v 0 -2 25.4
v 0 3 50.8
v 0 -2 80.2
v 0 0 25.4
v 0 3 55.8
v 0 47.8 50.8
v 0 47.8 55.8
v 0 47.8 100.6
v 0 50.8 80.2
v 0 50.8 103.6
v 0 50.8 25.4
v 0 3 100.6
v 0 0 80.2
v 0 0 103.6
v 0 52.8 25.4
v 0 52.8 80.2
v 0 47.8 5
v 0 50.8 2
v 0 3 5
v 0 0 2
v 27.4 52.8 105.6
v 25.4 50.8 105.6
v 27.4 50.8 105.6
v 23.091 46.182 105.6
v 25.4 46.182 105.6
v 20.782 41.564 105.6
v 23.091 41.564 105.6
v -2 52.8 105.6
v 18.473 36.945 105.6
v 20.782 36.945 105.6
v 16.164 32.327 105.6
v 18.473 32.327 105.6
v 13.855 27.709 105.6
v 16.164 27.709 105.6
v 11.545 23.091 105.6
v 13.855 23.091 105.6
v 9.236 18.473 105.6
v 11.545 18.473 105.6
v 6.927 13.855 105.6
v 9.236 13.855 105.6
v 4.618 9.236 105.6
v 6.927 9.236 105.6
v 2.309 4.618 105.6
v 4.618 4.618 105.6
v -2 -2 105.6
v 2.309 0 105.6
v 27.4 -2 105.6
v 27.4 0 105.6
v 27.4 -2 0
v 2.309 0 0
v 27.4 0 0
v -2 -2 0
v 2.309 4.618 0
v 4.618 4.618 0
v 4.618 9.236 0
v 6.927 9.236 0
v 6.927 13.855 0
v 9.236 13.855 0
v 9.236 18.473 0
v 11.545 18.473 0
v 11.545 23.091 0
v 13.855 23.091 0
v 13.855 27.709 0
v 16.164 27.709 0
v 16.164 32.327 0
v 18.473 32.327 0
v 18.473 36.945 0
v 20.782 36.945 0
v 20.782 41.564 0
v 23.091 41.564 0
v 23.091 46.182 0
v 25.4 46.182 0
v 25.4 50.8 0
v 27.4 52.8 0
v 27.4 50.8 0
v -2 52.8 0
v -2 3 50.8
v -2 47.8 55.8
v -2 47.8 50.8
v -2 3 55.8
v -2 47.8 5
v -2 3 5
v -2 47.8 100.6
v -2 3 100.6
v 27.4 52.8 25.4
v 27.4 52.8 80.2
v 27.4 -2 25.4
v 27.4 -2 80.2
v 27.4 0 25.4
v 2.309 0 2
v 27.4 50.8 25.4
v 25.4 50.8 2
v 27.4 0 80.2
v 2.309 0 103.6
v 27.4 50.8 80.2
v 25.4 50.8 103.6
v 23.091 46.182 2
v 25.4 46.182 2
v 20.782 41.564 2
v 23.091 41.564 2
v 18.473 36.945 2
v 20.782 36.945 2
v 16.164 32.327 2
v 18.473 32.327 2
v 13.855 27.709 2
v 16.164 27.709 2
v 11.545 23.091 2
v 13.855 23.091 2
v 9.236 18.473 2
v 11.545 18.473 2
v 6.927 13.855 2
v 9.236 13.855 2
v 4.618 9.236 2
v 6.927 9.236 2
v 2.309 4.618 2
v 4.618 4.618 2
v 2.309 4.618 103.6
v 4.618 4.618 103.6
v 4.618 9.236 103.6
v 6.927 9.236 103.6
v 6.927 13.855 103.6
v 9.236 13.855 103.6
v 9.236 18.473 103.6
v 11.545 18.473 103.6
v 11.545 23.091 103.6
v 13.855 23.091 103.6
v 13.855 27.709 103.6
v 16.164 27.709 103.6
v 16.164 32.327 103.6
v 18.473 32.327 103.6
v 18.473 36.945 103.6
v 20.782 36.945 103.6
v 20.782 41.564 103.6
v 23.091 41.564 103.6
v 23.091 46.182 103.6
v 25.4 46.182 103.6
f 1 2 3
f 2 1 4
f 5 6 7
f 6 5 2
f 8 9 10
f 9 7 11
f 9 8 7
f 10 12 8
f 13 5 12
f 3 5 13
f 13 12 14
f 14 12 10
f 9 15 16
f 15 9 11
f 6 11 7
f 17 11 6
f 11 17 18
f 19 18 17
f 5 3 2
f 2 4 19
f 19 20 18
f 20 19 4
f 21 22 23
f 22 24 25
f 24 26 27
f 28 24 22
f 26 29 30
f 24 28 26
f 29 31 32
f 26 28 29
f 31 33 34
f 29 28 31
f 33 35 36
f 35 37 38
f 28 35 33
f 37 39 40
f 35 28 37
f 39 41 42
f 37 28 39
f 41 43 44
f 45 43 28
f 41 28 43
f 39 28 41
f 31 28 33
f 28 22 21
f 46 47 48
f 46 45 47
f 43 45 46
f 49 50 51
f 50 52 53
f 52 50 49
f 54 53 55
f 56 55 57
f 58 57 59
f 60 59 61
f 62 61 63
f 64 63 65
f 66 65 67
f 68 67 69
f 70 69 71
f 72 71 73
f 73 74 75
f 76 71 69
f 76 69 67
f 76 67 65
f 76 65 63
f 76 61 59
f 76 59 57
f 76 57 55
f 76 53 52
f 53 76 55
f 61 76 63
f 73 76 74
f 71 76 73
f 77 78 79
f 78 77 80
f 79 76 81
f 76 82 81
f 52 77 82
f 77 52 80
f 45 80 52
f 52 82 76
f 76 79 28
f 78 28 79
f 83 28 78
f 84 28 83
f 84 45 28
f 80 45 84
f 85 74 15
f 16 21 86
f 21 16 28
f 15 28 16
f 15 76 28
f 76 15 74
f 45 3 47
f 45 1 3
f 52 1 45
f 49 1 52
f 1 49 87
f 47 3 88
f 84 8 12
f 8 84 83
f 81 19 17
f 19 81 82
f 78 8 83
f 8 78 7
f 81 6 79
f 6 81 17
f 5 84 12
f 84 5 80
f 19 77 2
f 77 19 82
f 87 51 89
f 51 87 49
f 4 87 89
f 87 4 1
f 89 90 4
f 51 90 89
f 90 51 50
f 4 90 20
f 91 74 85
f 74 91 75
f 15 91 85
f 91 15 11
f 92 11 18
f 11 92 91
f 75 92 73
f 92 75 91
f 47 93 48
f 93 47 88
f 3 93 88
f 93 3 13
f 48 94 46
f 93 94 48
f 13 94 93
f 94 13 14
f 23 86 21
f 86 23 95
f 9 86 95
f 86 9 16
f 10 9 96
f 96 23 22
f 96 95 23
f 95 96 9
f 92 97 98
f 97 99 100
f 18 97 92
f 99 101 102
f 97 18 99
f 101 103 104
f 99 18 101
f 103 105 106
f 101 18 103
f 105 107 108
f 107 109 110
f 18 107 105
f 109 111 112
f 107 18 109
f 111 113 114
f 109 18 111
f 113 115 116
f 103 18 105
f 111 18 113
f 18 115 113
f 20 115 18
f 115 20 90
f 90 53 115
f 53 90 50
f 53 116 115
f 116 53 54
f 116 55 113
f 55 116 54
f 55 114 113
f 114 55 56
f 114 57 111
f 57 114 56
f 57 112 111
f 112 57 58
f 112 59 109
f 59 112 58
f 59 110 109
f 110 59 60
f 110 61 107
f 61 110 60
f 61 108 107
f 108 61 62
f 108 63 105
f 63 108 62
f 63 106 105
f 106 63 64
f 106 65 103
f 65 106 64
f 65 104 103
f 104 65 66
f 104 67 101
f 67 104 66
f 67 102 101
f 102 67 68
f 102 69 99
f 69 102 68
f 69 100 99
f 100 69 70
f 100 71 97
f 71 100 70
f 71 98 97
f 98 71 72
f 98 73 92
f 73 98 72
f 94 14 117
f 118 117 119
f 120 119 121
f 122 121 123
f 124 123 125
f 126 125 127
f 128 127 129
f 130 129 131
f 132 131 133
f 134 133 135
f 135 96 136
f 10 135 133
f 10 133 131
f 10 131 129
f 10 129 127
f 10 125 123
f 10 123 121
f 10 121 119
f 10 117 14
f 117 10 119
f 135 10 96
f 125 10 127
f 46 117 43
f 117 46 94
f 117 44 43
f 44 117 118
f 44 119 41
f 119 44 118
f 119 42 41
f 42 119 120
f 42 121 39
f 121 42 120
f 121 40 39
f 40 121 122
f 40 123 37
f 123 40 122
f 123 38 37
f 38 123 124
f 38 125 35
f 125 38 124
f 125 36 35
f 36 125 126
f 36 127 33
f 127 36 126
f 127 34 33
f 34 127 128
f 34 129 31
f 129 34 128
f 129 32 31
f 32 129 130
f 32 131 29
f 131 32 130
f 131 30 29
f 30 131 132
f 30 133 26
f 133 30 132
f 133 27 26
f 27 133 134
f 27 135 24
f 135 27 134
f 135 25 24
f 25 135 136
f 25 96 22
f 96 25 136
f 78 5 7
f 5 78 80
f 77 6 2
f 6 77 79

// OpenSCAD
// file: steps.scad
include<constants.scad>


//steps();

// cap factory

for (a =[2:6]) {
    translate([0, (a-1) * (2 * unitHeight + 20),0]) 
   steps(a);
}


// footerInterface();

module steps(units = 4) {

    depth = 2 * unitHeight;
    width = units * unitHeight;

    for(i = [0 : 1 : 11]) {
        translate([0,i*stepTred, 0]) 
        cube([width, depth- i*stepTred, (i + 1) * stepHeight]) ;
    }

    translate([width-stepTred,0,0]) 
    footerInterface ();

    translate([stepTred,0,0]) 
    mirror([1,0,0]) 
    footerInterface ();


}



module footerInterface() {
    interfaceLength = 2 * stepTred;

difference() {
    cube([stepTred,interfaceLength, 3 *stepHeight]) ;
    translate([0,-0.5, stepHeight + stepTred]) {
        rotate([-90,0,0])  {
            cylinder(interfaceLength + 1, r = stepTred);
        }
    }
}
}
// file: constants.scad
inchRatio = 25.4;
nozzelThickness = 0.4;
subUnitSide = 6 * inchRatio;


unitHeight = 1 * inchRatio;
// stepHeight = unitHeight / 12;
stepHeight = unitHeight / 11;
stepTred = (2 * unitHeight) / 11;

$fn = $preview ? 32 : 64;


capHeight = 2 * stepHeight;
capWidth = 4 * nozzelThickness;
taperHeight = .75;
taperWidth = stepTred;

default_wall = 2;
// main file
include <constants.scad>;
use <steps.scad>;

interior_x_in = 1;
interior_y_in = 2;
interior_z_in = 4;

exterior_x  = interior_x_in * inchRatio +  default_wall;
exterior_y = interior_y_in * inchRatio + 2 * default_wall;
exterior_z = interior_z_in * inchRatio + 2 * default_wall;

channel = 1;
channel_y = channel + stepHeight;
channel_z = channel + stepTred;

// difference() {
//     cube([exterior_x, exterior_y, exterior_z]);
//     translate([default_wall,default_wall,default_wall]) {
//         cube([exterior_x - 2 * default_wall, exterior_y - 2 * default_wall, exterior_z]);
//     }


//     stepChannel();

//     translate([exterior_x - default_wall,0,0])  stepChannel();

// }

// module stepChannel() {
//     for(i = [1 : 1 : 11]) {
//         translate([
//             -1, 
//             default_wall - channel + (i * stepHeight),  
//             default_wall + stepTred * (i)]) 
//         cube([
//             2 * default_wall,
//             channel,
//             channel_z]);
//     }


//     for(i = [1 : 1 : 11]) {
//         translate([
//             -1, 
//             default_wall - channel + (i-1) * stepHeight,  
//             default_wall + stepTred* i]) 
//         cube([2 * default_wall,channel_y,channel]);
//     }
// }

difference() {
translate([-default_wall,-default_wall,0]) cube ([default_wall,exterior_y,exterior_z]);
translate([-default_wall * 2,-default_wall + 5,+5]) cube ([default_wall* 2,exterior_y - 10,exterior_z - 10]);
}



translate([0,-default_wall,0]) xBlade();
translate([0,exterior_y- 2 * default_wall,0]) xBlade();

translate([0,-default_wall,exterior_z- inchRatio]) xBlade();
translate([0,exterior_y- 2 * default_wall,exterior_z- inchRatio]) xBlade();


stepProjection();
translate([0,0,exterior_z- default_wall]) 
stepProjection(); 



module xBlade() {
    cube ([exterior_x,default_wall,inchRatio]);
}

module stepProjection() {

    linear_extrude(default_wall) {
        projection(true) 
        translate([0,0, 15])
        rotate([0,90,0]) 
        steps(1);
    }

}

translate([-default_wall, -default_wall, exterior_z/ 2 -default_wall ]) 
#cube ([default_wall, exterior_y, 5 ]);
